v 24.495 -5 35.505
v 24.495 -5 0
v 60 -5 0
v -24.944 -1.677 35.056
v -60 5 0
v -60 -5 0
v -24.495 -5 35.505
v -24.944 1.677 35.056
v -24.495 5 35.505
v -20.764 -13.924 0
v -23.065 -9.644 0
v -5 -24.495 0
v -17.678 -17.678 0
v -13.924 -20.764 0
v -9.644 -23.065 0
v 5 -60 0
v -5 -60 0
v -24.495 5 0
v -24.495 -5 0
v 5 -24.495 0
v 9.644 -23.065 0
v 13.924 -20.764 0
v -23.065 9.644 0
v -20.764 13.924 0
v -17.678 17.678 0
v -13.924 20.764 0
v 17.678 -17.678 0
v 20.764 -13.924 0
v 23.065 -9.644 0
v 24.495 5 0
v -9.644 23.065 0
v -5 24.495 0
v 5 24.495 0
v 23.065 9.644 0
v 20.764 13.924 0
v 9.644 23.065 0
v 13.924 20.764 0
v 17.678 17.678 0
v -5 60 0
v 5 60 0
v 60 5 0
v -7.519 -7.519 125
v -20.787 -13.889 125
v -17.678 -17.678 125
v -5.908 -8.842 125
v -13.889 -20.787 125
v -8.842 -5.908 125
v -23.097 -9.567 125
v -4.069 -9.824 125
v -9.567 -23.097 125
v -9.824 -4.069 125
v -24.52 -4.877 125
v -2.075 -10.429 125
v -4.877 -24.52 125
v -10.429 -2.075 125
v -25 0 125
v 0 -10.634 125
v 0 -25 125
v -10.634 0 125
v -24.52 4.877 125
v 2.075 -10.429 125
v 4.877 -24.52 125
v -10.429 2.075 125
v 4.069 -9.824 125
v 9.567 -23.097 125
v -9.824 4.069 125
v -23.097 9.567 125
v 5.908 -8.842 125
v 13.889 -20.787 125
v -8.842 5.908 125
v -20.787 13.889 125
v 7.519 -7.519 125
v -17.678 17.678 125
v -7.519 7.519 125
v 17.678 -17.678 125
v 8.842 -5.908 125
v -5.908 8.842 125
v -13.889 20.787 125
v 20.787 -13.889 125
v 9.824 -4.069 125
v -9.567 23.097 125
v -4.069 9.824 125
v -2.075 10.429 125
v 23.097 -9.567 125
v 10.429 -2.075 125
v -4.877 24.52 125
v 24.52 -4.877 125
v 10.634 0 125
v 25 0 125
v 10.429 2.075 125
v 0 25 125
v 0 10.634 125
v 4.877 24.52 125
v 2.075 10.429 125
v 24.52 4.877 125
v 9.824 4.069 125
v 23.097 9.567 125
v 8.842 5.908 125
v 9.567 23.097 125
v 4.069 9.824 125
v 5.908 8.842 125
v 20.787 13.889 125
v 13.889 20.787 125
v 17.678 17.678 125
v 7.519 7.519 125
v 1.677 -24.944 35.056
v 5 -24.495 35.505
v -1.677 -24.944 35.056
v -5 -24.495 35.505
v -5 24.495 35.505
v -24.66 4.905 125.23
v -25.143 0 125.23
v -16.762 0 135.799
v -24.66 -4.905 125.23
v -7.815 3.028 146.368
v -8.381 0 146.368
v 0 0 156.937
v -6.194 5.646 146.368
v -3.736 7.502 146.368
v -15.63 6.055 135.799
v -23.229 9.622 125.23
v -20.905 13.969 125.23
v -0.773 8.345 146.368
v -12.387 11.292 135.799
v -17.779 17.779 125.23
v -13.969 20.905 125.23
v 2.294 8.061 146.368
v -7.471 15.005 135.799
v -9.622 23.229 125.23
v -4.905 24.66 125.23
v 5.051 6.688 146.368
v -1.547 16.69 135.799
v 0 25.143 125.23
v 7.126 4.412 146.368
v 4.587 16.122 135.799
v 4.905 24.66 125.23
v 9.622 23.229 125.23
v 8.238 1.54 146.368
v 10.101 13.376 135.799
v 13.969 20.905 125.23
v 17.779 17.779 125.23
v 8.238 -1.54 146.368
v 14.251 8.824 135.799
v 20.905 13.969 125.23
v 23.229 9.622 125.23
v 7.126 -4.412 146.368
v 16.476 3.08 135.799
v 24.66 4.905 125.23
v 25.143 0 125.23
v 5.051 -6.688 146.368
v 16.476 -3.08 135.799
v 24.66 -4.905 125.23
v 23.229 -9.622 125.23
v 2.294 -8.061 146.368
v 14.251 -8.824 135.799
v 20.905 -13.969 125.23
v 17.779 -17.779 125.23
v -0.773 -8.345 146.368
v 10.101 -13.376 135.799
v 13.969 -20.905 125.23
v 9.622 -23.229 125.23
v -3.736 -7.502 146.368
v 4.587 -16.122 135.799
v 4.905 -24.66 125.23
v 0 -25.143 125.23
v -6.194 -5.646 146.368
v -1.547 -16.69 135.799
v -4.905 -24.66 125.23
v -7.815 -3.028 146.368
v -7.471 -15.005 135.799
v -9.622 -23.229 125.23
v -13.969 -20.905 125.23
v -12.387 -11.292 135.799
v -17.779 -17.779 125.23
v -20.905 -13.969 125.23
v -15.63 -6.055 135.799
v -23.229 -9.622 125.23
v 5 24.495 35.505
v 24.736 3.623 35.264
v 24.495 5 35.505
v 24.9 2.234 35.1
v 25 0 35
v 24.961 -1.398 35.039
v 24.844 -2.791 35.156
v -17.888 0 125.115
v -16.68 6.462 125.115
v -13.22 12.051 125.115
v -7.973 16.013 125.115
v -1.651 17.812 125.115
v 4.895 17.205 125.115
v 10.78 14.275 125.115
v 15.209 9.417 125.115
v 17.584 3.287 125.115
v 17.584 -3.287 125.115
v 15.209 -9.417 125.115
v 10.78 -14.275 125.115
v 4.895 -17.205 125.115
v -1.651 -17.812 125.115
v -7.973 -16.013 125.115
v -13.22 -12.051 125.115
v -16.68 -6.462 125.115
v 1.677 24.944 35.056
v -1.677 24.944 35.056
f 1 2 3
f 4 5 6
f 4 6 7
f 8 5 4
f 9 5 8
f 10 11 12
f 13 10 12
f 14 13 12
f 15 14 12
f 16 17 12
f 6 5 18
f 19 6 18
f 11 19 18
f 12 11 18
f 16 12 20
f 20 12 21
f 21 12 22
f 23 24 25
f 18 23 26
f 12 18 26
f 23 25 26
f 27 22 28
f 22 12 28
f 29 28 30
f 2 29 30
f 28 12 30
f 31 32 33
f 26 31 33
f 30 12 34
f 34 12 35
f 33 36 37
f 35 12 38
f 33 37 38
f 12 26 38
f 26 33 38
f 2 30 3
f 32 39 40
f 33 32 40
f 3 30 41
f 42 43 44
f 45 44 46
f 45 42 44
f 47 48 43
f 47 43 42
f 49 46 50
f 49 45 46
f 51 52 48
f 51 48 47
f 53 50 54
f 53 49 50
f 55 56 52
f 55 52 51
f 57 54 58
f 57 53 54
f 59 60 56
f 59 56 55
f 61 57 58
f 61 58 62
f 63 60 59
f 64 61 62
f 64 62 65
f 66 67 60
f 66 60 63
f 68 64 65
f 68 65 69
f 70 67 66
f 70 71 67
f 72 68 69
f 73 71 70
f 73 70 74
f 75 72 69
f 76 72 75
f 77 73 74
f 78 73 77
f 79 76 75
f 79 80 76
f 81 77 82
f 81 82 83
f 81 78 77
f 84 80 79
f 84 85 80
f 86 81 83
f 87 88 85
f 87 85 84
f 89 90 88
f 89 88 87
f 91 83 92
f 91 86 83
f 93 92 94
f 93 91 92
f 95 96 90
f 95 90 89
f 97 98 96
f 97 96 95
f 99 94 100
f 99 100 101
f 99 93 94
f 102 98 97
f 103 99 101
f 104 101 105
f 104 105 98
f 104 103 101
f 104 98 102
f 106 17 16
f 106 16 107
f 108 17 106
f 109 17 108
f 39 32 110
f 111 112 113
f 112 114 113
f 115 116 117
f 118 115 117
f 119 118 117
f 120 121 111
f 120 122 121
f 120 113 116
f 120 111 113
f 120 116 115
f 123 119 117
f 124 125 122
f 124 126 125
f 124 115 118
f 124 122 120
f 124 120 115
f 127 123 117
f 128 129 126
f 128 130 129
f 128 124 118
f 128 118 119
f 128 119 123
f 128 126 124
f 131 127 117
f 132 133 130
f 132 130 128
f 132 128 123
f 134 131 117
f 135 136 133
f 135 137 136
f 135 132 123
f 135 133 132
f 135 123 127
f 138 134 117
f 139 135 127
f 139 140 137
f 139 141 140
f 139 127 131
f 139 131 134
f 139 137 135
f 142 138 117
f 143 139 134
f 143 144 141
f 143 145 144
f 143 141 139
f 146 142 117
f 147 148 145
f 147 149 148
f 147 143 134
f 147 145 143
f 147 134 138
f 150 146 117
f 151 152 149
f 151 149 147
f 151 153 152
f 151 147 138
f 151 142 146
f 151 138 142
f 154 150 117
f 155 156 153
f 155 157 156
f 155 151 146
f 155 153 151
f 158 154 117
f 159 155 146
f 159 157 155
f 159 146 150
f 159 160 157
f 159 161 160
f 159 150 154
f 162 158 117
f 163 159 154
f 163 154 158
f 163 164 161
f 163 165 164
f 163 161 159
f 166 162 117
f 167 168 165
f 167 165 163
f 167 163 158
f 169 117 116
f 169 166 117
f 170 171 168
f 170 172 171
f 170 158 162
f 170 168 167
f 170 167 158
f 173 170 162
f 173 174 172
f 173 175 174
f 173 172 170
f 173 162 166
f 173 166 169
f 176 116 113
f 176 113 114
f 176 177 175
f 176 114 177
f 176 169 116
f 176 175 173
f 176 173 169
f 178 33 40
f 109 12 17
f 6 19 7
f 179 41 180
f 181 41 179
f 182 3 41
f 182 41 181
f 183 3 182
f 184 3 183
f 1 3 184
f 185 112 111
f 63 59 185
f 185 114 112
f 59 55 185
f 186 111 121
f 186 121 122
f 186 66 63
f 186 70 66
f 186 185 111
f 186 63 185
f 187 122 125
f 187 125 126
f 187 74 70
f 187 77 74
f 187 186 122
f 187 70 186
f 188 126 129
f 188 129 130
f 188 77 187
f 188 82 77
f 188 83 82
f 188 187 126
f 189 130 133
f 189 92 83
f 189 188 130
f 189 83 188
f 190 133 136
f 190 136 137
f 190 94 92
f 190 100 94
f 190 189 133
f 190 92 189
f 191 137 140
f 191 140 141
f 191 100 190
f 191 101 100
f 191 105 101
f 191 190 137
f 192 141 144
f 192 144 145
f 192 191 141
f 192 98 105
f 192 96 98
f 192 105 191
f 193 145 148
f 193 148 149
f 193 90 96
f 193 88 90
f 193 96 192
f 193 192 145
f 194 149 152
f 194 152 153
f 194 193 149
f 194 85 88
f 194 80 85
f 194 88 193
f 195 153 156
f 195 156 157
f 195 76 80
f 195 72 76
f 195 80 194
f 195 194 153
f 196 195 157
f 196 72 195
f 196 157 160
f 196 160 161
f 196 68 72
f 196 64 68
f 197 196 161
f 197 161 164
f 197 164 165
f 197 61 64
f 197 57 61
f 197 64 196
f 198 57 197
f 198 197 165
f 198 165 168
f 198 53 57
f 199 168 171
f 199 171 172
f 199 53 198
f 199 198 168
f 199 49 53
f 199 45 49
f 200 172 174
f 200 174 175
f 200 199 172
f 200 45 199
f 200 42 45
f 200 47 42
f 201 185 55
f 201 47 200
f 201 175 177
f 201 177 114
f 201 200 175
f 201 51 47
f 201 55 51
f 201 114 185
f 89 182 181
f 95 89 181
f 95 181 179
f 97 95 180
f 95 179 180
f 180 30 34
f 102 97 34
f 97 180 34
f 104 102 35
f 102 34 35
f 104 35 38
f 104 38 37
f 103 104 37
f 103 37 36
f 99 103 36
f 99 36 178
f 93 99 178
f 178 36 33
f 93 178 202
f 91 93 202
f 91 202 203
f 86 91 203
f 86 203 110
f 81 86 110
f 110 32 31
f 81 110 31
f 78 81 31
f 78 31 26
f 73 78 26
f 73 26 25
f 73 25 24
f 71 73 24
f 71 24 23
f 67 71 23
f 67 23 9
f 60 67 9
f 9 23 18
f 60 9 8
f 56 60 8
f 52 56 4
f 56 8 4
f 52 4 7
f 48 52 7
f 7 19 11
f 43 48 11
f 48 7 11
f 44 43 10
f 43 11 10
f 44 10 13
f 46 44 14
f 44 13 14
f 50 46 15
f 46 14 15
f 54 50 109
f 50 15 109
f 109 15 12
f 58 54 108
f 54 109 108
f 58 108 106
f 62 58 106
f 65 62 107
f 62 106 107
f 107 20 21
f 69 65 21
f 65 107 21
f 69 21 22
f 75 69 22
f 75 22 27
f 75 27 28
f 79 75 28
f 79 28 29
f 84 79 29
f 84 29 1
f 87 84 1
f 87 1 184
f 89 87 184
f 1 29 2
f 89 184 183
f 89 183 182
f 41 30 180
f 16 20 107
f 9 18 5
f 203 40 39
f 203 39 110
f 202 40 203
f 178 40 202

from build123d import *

# Parameters (mm, degrees)
F0_R            = 25
F1_DEPTH        = 125
F3_DEPTH        = 5
F3_COPIES_COUNT = 4


# Not quite as in the source:
# - a pattern or mirror of a feature is missing from the dataset's text; its kind, count and spacing are read off the source's solid


with BuildPart() as f1:
    # F0 (on Top) → F1 (new body)
    with BuildSketch(Plane.XY):
        Circle(F0_R)
    extrude(amount=F1_DEPTH)

    # F2 (on Front) → F3 (join, symmetric)
    with BuildSketch(Plane.XZ):
        Polygon((0, 60), (0, 0), (60, 0), align=None)
    f3 = extrude(amount=F3_DEPTH, both=True)

    # F3_copies: F3 ×4 about axis
    f3_copies_axis = Axis((0, 0, 0), (0, 0, 1))
    for i in range(1, F3_COPIES_COUNT):
        add(f3.rotate(f3_copies_axis, i * 360 / F3_COPIES_COUNT))

    # F4 (on Front) → F5 (revolve)
    with BuildSketch(Plane.XZ):
        Polygon((0, 156.9369882345), (-25.1428224146, 125.2296715975), (0, 124.8316764832), align=None)
    revolve(axis=Axis((0, 0, 140.8843323588), (0, 0, -1)))


solid = f1.part
